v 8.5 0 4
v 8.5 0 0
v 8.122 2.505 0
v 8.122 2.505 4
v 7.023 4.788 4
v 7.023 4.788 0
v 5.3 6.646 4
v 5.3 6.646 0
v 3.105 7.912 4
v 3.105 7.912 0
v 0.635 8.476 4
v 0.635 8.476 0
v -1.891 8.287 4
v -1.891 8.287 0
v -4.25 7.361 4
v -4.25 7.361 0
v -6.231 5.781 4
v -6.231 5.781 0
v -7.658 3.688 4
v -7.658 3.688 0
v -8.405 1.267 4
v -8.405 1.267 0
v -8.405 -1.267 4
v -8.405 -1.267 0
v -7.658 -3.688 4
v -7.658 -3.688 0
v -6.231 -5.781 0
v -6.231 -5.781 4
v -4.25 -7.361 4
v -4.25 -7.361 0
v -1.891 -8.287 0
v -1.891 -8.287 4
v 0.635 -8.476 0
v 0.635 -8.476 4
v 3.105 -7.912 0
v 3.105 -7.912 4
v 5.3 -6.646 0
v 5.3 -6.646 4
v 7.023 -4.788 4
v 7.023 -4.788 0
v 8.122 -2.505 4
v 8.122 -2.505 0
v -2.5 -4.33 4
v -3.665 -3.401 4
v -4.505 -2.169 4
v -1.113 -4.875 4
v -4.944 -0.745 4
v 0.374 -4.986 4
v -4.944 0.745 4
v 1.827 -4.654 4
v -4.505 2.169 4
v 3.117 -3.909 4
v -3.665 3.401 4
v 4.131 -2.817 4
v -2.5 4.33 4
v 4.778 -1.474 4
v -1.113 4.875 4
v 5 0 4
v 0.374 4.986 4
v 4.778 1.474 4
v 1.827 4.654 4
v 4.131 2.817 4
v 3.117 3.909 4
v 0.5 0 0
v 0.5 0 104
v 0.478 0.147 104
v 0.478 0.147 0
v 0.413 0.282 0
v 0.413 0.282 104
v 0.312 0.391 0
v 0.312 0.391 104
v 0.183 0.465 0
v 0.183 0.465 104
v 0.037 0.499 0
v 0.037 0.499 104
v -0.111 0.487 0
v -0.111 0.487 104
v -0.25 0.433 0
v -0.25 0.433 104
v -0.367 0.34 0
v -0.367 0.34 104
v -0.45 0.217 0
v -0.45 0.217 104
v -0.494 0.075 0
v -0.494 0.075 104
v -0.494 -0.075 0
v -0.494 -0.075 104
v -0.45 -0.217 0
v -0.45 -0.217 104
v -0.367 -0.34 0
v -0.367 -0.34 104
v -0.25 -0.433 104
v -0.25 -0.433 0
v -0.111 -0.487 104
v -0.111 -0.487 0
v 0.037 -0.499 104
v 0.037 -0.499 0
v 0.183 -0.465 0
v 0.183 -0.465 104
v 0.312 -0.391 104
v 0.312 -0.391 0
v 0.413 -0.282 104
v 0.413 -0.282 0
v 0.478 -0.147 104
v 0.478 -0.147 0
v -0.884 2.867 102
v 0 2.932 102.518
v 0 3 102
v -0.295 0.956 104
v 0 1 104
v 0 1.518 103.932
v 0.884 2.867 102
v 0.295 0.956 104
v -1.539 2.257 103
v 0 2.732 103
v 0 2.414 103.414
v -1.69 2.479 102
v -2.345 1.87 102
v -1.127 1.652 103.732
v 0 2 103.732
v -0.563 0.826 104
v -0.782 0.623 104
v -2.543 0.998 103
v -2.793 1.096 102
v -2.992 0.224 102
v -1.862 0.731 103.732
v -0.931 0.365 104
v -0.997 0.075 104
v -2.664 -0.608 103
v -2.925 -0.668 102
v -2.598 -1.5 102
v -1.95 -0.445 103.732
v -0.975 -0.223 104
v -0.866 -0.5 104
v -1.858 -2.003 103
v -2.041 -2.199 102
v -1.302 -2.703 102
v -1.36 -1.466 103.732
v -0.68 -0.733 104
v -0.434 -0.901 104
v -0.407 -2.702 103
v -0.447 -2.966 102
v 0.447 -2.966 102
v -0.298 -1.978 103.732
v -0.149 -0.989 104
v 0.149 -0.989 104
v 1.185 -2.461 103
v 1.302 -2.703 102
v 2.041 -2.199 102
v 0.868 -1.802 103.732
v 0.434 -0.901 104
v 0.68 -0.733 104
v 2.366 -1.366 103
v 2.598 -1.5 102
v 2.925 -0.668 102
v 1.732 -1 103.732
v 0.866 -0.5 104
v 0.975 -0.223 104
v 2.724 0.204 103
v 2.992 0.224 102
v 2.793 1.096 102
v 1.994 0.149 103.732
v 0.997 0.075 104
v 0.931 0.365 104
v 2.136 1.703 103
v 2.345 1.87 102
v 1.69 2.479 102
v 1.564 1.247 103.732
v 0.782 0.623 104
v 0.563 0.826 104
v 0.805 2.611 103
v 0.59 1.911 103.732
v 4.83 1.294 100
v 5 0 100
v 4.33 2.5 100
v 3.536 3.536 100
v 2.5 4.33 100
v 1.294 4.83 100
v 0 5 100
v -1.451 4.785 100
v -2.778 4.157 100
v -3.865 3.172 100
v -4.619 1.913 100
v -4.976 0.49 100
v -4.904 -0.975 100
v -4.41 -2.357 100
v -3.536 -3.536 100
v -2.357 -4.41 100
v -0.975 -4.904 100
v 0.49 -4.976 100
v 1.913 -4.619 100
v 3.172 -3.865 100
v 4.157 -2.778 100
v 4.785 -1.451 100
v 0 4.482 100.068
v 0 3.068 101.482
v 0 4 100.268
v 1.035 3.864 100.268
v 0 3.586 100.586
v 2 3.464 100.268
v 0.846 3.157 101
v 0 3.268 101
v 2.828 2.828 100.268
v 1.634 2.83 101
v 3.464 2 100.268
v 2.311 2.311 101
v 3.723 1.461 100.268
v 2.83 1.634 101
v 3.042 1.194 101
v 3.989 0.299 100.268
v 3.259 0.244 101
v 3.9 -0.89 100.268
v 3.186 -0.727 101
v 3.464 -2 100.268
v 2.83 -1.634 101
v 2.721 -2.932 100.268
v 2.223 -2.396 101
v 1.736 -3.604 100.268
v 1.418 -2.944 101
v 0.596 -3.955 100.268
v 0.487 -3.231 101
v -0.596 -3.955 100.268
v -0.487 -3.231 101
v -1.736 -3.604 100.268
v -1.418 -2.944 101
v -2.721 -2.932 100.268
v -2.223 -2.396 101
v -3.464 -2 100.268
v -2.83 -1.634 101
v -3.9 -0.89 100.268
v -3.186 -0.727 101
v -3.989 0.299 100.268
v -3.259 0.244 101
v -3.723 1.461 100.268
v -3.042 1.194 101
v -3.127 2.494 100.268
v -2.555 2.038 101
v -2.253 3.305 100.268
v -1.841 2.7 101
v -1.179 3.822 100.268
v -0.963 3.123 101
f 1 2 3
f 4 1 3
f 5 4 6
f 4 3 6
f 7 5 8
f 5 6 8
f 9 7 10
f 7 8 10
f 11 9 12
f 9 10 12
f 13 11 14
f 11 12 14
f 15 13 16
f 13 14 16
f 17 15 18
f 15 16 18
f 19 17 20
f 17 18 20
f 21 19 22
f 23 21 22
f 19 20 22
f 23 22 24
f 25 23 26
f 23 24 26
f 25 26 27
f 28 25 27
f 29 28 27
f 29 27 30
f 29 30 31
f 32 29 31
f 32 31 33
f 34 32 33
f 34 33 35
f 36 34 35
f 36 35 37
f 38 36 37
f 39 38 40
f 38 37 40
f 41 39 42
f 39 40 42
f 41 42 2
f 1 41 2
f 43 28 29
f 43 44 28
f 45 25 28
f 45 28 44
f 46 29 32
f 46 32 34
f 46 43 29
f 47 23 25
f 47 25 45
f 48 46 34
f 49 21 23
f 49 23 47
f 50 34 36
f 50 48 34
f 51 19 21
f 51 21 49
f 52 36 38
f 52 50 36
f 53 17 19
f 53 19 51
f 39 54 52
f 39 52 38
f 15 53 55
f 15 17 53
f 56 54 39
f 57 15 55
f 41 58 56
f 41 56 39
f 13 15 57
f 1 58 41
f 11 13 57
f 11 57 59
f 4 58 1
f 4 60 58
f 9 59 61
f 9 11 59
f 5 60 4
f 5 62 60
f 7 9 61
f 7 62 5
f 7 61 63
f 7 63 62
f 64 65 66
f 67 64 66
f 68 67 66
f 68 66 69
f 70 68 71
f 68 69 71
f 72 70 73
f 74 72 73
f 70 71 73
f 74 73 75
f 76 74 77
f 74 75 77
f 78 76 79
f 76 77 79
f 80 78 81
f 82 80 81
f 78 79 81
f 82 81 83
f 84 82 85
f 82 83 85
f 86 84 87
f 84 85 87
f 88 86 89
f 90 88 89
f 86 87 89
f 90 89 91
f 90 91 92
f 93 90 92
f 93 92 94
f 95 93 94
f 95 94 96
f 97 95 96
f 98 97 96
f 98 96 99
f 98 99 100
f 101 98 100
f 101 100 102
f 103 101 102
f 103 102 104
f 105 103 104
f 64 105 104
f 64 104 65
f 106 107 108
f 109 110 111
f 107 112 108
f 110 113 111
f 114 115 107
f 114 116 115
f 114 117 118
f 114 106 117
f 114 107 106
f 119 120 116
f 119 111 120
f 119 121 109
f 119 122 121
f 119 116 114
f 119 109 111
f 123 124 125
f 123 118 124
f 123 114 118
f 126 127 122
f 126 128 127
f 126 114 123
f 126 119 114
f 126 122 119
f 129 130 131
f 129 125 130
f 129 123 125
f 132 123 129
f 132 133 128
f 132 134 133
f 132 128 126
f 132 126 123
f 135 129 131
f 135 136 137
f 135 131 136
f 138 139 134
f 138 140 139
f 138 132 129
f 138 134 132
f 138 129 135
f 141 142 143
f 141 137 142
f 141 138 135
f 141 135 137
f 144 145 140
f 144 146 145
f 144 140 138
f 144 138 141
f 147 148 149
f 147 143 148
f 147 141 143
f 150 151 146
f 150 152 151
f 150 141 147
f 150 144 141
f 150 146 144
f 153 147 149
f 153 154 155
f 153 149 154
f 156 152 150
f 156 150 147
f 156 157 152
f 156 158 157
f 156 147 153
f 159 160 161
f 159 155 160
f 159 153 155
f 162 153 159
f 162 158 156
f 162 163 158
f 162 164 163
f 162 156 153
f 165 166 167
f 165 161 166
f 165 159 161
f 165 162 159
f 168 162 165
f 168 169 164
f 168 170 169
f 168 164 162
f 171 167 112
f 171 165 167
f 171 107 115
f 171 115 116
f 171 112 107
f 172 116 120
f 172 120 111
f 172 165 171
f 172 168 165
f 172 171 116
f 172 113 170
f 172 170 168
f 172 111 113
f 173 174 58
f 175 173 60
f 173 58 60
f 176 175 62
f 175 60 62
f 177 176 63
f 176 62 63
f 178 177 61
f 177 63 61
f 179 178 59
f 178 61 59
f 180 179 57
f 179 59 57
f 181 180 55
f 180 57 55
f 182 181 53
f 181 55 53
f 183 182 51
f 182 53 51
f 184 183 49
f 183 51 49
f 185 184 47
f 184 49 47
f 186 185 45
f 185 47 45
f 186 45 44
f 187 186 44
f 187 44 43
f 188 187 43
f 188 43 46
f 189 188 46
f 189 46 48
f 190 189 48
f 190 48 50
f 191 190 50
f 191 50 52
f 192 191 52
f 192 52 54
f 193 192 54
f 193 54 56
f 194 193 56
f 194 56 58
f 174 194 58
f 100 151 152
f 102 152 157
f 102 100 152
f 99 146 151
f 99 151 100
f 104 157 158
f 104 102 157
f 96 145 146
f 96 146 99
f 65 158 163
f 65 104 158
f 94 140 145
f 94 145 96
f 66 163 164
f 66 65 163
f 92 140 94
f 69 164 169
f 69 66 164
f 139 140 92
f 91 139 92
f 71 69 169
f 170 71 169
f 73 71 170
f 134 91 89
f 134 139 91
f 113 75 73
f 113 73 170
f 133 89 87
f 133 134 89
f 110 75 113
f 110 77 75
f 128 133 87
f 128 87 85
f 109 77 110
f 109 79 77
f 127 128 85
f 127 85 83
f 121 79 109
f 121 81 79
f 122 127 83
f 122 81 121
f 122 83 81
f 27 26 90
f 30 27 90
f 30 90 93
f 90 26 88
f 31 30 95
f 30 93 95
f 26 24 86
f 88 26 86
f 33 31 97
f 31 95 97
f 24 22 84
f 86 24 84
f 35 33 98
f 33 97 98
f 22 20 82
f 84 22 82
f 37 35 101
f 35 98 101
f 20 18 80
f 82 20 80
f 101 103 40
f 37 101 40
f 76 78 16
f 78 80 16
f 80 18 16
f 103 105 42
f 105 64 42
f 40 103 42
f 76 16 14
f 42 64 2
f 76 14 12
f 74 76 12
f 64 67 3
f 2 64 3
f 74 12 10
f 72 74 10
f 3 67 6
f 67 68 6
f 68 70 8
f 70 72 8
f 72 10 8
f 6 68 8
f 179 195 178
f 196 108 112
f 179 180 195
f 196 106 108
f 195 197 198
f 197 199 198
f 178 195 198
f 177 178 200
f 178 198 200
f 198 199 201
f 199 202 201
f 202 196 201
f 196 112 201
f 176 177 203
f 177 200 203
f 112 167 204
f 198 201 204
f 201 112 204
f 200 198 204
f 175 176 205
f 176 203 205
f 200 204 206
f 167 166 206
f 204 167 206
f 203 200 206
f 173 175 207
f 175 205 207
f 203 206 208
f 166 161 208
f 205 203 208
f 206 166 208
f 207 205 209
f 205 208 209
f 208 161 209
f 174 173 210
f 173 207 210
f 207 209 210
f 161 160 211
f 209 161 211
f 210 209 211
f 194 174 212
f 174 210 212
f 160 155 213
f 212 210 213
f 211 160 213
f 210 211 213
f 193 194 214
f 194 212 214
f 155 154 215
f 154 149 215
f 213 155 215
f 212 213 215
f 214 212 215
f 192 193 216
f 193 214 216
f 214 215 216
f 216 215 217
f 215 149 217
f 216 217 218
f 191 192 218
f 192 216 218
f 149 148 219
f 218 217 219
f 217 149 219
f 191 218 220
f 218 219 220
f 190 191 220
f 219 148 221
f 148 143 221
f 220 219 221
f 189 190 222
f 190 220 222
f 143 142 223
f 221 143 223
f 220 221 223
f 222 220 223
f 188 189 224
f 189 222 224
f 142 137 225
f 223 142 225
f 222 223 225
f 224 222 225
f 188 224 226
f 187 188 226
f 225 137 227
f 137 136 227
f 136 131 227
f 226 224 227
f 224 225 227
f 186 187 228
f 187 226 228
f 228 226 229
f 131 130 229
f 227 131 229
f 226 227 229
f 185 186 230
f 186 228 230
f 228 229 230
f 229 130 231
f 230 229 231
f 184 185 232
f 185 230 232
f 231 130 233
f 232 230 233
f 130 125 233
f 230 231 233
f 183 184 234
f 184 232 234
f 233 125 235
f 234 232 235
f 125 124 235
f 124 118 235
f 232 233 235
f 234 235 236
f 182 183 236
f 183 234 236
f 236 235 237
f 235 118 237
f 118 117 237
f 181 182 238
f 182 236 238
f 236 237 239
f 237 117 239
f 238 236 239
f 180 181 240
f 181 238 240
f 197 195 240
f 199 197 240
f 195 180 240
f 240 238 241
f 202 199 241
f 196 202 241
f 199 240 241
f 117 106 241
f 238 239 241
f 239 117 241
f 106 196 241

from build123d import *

# Parameters (mm, degrees)
F0_R     = 8.5
F1_DEPTH = 4
F2_R     = 5
F3_DEPTH = 100
F8_R     = 0.5
F9_DEPTH = 114.1


with BuildPart() as f1:
    # F0 (on Top) → F1 (new body)
    with BuildSketch(Plane.XY):
        Circle(F0_R)
    extrude(amount=F1_DEPTH)

    # F2 (on Top) → F3 (join)
    with BuildSketch(Plane.XY):
        Circle(F2_R)
    extrude(amount=F3_DEPTH)

    # F4 (on Right) → F5 (revolve)
    with BuildSketch(Plane.YZ):
        with BuildLine():
            Line((3, 102), (0, 102))
            Line((0, 102), (0, 100))
            Line((0, 100), (5, 100))
            ThreePointArc((5, 100), (3.585786, 100.585786), (3, 102))
        make_face()
    revolve(axis=Axis((0, 0, 101), (0, 0, -1)))

    # F6 (on Right) → F7 (revolve)
    with BuildSketch(Plane.YZ):
        with BuildLine():
            Line((0, 104), (0, 102))
            Line((0, 102), (3, 102))
            ThreePointArc((3, 102), (2.414214, 103.414214), (1, 104))
            Line((1, 104), (0, 104))
        make_face()
    revolve(axis=Axis((0, 0, 103), (0, 0, 1)))

    # F8 (on face) → F9 (cut)
    with BuildSketch(Plane.XY.offset(104)):
        Circle(F8_R)
    extrude(amount=-F9_DEPTH, mode=Mode.SUBTRACT)


solid = f1.part
